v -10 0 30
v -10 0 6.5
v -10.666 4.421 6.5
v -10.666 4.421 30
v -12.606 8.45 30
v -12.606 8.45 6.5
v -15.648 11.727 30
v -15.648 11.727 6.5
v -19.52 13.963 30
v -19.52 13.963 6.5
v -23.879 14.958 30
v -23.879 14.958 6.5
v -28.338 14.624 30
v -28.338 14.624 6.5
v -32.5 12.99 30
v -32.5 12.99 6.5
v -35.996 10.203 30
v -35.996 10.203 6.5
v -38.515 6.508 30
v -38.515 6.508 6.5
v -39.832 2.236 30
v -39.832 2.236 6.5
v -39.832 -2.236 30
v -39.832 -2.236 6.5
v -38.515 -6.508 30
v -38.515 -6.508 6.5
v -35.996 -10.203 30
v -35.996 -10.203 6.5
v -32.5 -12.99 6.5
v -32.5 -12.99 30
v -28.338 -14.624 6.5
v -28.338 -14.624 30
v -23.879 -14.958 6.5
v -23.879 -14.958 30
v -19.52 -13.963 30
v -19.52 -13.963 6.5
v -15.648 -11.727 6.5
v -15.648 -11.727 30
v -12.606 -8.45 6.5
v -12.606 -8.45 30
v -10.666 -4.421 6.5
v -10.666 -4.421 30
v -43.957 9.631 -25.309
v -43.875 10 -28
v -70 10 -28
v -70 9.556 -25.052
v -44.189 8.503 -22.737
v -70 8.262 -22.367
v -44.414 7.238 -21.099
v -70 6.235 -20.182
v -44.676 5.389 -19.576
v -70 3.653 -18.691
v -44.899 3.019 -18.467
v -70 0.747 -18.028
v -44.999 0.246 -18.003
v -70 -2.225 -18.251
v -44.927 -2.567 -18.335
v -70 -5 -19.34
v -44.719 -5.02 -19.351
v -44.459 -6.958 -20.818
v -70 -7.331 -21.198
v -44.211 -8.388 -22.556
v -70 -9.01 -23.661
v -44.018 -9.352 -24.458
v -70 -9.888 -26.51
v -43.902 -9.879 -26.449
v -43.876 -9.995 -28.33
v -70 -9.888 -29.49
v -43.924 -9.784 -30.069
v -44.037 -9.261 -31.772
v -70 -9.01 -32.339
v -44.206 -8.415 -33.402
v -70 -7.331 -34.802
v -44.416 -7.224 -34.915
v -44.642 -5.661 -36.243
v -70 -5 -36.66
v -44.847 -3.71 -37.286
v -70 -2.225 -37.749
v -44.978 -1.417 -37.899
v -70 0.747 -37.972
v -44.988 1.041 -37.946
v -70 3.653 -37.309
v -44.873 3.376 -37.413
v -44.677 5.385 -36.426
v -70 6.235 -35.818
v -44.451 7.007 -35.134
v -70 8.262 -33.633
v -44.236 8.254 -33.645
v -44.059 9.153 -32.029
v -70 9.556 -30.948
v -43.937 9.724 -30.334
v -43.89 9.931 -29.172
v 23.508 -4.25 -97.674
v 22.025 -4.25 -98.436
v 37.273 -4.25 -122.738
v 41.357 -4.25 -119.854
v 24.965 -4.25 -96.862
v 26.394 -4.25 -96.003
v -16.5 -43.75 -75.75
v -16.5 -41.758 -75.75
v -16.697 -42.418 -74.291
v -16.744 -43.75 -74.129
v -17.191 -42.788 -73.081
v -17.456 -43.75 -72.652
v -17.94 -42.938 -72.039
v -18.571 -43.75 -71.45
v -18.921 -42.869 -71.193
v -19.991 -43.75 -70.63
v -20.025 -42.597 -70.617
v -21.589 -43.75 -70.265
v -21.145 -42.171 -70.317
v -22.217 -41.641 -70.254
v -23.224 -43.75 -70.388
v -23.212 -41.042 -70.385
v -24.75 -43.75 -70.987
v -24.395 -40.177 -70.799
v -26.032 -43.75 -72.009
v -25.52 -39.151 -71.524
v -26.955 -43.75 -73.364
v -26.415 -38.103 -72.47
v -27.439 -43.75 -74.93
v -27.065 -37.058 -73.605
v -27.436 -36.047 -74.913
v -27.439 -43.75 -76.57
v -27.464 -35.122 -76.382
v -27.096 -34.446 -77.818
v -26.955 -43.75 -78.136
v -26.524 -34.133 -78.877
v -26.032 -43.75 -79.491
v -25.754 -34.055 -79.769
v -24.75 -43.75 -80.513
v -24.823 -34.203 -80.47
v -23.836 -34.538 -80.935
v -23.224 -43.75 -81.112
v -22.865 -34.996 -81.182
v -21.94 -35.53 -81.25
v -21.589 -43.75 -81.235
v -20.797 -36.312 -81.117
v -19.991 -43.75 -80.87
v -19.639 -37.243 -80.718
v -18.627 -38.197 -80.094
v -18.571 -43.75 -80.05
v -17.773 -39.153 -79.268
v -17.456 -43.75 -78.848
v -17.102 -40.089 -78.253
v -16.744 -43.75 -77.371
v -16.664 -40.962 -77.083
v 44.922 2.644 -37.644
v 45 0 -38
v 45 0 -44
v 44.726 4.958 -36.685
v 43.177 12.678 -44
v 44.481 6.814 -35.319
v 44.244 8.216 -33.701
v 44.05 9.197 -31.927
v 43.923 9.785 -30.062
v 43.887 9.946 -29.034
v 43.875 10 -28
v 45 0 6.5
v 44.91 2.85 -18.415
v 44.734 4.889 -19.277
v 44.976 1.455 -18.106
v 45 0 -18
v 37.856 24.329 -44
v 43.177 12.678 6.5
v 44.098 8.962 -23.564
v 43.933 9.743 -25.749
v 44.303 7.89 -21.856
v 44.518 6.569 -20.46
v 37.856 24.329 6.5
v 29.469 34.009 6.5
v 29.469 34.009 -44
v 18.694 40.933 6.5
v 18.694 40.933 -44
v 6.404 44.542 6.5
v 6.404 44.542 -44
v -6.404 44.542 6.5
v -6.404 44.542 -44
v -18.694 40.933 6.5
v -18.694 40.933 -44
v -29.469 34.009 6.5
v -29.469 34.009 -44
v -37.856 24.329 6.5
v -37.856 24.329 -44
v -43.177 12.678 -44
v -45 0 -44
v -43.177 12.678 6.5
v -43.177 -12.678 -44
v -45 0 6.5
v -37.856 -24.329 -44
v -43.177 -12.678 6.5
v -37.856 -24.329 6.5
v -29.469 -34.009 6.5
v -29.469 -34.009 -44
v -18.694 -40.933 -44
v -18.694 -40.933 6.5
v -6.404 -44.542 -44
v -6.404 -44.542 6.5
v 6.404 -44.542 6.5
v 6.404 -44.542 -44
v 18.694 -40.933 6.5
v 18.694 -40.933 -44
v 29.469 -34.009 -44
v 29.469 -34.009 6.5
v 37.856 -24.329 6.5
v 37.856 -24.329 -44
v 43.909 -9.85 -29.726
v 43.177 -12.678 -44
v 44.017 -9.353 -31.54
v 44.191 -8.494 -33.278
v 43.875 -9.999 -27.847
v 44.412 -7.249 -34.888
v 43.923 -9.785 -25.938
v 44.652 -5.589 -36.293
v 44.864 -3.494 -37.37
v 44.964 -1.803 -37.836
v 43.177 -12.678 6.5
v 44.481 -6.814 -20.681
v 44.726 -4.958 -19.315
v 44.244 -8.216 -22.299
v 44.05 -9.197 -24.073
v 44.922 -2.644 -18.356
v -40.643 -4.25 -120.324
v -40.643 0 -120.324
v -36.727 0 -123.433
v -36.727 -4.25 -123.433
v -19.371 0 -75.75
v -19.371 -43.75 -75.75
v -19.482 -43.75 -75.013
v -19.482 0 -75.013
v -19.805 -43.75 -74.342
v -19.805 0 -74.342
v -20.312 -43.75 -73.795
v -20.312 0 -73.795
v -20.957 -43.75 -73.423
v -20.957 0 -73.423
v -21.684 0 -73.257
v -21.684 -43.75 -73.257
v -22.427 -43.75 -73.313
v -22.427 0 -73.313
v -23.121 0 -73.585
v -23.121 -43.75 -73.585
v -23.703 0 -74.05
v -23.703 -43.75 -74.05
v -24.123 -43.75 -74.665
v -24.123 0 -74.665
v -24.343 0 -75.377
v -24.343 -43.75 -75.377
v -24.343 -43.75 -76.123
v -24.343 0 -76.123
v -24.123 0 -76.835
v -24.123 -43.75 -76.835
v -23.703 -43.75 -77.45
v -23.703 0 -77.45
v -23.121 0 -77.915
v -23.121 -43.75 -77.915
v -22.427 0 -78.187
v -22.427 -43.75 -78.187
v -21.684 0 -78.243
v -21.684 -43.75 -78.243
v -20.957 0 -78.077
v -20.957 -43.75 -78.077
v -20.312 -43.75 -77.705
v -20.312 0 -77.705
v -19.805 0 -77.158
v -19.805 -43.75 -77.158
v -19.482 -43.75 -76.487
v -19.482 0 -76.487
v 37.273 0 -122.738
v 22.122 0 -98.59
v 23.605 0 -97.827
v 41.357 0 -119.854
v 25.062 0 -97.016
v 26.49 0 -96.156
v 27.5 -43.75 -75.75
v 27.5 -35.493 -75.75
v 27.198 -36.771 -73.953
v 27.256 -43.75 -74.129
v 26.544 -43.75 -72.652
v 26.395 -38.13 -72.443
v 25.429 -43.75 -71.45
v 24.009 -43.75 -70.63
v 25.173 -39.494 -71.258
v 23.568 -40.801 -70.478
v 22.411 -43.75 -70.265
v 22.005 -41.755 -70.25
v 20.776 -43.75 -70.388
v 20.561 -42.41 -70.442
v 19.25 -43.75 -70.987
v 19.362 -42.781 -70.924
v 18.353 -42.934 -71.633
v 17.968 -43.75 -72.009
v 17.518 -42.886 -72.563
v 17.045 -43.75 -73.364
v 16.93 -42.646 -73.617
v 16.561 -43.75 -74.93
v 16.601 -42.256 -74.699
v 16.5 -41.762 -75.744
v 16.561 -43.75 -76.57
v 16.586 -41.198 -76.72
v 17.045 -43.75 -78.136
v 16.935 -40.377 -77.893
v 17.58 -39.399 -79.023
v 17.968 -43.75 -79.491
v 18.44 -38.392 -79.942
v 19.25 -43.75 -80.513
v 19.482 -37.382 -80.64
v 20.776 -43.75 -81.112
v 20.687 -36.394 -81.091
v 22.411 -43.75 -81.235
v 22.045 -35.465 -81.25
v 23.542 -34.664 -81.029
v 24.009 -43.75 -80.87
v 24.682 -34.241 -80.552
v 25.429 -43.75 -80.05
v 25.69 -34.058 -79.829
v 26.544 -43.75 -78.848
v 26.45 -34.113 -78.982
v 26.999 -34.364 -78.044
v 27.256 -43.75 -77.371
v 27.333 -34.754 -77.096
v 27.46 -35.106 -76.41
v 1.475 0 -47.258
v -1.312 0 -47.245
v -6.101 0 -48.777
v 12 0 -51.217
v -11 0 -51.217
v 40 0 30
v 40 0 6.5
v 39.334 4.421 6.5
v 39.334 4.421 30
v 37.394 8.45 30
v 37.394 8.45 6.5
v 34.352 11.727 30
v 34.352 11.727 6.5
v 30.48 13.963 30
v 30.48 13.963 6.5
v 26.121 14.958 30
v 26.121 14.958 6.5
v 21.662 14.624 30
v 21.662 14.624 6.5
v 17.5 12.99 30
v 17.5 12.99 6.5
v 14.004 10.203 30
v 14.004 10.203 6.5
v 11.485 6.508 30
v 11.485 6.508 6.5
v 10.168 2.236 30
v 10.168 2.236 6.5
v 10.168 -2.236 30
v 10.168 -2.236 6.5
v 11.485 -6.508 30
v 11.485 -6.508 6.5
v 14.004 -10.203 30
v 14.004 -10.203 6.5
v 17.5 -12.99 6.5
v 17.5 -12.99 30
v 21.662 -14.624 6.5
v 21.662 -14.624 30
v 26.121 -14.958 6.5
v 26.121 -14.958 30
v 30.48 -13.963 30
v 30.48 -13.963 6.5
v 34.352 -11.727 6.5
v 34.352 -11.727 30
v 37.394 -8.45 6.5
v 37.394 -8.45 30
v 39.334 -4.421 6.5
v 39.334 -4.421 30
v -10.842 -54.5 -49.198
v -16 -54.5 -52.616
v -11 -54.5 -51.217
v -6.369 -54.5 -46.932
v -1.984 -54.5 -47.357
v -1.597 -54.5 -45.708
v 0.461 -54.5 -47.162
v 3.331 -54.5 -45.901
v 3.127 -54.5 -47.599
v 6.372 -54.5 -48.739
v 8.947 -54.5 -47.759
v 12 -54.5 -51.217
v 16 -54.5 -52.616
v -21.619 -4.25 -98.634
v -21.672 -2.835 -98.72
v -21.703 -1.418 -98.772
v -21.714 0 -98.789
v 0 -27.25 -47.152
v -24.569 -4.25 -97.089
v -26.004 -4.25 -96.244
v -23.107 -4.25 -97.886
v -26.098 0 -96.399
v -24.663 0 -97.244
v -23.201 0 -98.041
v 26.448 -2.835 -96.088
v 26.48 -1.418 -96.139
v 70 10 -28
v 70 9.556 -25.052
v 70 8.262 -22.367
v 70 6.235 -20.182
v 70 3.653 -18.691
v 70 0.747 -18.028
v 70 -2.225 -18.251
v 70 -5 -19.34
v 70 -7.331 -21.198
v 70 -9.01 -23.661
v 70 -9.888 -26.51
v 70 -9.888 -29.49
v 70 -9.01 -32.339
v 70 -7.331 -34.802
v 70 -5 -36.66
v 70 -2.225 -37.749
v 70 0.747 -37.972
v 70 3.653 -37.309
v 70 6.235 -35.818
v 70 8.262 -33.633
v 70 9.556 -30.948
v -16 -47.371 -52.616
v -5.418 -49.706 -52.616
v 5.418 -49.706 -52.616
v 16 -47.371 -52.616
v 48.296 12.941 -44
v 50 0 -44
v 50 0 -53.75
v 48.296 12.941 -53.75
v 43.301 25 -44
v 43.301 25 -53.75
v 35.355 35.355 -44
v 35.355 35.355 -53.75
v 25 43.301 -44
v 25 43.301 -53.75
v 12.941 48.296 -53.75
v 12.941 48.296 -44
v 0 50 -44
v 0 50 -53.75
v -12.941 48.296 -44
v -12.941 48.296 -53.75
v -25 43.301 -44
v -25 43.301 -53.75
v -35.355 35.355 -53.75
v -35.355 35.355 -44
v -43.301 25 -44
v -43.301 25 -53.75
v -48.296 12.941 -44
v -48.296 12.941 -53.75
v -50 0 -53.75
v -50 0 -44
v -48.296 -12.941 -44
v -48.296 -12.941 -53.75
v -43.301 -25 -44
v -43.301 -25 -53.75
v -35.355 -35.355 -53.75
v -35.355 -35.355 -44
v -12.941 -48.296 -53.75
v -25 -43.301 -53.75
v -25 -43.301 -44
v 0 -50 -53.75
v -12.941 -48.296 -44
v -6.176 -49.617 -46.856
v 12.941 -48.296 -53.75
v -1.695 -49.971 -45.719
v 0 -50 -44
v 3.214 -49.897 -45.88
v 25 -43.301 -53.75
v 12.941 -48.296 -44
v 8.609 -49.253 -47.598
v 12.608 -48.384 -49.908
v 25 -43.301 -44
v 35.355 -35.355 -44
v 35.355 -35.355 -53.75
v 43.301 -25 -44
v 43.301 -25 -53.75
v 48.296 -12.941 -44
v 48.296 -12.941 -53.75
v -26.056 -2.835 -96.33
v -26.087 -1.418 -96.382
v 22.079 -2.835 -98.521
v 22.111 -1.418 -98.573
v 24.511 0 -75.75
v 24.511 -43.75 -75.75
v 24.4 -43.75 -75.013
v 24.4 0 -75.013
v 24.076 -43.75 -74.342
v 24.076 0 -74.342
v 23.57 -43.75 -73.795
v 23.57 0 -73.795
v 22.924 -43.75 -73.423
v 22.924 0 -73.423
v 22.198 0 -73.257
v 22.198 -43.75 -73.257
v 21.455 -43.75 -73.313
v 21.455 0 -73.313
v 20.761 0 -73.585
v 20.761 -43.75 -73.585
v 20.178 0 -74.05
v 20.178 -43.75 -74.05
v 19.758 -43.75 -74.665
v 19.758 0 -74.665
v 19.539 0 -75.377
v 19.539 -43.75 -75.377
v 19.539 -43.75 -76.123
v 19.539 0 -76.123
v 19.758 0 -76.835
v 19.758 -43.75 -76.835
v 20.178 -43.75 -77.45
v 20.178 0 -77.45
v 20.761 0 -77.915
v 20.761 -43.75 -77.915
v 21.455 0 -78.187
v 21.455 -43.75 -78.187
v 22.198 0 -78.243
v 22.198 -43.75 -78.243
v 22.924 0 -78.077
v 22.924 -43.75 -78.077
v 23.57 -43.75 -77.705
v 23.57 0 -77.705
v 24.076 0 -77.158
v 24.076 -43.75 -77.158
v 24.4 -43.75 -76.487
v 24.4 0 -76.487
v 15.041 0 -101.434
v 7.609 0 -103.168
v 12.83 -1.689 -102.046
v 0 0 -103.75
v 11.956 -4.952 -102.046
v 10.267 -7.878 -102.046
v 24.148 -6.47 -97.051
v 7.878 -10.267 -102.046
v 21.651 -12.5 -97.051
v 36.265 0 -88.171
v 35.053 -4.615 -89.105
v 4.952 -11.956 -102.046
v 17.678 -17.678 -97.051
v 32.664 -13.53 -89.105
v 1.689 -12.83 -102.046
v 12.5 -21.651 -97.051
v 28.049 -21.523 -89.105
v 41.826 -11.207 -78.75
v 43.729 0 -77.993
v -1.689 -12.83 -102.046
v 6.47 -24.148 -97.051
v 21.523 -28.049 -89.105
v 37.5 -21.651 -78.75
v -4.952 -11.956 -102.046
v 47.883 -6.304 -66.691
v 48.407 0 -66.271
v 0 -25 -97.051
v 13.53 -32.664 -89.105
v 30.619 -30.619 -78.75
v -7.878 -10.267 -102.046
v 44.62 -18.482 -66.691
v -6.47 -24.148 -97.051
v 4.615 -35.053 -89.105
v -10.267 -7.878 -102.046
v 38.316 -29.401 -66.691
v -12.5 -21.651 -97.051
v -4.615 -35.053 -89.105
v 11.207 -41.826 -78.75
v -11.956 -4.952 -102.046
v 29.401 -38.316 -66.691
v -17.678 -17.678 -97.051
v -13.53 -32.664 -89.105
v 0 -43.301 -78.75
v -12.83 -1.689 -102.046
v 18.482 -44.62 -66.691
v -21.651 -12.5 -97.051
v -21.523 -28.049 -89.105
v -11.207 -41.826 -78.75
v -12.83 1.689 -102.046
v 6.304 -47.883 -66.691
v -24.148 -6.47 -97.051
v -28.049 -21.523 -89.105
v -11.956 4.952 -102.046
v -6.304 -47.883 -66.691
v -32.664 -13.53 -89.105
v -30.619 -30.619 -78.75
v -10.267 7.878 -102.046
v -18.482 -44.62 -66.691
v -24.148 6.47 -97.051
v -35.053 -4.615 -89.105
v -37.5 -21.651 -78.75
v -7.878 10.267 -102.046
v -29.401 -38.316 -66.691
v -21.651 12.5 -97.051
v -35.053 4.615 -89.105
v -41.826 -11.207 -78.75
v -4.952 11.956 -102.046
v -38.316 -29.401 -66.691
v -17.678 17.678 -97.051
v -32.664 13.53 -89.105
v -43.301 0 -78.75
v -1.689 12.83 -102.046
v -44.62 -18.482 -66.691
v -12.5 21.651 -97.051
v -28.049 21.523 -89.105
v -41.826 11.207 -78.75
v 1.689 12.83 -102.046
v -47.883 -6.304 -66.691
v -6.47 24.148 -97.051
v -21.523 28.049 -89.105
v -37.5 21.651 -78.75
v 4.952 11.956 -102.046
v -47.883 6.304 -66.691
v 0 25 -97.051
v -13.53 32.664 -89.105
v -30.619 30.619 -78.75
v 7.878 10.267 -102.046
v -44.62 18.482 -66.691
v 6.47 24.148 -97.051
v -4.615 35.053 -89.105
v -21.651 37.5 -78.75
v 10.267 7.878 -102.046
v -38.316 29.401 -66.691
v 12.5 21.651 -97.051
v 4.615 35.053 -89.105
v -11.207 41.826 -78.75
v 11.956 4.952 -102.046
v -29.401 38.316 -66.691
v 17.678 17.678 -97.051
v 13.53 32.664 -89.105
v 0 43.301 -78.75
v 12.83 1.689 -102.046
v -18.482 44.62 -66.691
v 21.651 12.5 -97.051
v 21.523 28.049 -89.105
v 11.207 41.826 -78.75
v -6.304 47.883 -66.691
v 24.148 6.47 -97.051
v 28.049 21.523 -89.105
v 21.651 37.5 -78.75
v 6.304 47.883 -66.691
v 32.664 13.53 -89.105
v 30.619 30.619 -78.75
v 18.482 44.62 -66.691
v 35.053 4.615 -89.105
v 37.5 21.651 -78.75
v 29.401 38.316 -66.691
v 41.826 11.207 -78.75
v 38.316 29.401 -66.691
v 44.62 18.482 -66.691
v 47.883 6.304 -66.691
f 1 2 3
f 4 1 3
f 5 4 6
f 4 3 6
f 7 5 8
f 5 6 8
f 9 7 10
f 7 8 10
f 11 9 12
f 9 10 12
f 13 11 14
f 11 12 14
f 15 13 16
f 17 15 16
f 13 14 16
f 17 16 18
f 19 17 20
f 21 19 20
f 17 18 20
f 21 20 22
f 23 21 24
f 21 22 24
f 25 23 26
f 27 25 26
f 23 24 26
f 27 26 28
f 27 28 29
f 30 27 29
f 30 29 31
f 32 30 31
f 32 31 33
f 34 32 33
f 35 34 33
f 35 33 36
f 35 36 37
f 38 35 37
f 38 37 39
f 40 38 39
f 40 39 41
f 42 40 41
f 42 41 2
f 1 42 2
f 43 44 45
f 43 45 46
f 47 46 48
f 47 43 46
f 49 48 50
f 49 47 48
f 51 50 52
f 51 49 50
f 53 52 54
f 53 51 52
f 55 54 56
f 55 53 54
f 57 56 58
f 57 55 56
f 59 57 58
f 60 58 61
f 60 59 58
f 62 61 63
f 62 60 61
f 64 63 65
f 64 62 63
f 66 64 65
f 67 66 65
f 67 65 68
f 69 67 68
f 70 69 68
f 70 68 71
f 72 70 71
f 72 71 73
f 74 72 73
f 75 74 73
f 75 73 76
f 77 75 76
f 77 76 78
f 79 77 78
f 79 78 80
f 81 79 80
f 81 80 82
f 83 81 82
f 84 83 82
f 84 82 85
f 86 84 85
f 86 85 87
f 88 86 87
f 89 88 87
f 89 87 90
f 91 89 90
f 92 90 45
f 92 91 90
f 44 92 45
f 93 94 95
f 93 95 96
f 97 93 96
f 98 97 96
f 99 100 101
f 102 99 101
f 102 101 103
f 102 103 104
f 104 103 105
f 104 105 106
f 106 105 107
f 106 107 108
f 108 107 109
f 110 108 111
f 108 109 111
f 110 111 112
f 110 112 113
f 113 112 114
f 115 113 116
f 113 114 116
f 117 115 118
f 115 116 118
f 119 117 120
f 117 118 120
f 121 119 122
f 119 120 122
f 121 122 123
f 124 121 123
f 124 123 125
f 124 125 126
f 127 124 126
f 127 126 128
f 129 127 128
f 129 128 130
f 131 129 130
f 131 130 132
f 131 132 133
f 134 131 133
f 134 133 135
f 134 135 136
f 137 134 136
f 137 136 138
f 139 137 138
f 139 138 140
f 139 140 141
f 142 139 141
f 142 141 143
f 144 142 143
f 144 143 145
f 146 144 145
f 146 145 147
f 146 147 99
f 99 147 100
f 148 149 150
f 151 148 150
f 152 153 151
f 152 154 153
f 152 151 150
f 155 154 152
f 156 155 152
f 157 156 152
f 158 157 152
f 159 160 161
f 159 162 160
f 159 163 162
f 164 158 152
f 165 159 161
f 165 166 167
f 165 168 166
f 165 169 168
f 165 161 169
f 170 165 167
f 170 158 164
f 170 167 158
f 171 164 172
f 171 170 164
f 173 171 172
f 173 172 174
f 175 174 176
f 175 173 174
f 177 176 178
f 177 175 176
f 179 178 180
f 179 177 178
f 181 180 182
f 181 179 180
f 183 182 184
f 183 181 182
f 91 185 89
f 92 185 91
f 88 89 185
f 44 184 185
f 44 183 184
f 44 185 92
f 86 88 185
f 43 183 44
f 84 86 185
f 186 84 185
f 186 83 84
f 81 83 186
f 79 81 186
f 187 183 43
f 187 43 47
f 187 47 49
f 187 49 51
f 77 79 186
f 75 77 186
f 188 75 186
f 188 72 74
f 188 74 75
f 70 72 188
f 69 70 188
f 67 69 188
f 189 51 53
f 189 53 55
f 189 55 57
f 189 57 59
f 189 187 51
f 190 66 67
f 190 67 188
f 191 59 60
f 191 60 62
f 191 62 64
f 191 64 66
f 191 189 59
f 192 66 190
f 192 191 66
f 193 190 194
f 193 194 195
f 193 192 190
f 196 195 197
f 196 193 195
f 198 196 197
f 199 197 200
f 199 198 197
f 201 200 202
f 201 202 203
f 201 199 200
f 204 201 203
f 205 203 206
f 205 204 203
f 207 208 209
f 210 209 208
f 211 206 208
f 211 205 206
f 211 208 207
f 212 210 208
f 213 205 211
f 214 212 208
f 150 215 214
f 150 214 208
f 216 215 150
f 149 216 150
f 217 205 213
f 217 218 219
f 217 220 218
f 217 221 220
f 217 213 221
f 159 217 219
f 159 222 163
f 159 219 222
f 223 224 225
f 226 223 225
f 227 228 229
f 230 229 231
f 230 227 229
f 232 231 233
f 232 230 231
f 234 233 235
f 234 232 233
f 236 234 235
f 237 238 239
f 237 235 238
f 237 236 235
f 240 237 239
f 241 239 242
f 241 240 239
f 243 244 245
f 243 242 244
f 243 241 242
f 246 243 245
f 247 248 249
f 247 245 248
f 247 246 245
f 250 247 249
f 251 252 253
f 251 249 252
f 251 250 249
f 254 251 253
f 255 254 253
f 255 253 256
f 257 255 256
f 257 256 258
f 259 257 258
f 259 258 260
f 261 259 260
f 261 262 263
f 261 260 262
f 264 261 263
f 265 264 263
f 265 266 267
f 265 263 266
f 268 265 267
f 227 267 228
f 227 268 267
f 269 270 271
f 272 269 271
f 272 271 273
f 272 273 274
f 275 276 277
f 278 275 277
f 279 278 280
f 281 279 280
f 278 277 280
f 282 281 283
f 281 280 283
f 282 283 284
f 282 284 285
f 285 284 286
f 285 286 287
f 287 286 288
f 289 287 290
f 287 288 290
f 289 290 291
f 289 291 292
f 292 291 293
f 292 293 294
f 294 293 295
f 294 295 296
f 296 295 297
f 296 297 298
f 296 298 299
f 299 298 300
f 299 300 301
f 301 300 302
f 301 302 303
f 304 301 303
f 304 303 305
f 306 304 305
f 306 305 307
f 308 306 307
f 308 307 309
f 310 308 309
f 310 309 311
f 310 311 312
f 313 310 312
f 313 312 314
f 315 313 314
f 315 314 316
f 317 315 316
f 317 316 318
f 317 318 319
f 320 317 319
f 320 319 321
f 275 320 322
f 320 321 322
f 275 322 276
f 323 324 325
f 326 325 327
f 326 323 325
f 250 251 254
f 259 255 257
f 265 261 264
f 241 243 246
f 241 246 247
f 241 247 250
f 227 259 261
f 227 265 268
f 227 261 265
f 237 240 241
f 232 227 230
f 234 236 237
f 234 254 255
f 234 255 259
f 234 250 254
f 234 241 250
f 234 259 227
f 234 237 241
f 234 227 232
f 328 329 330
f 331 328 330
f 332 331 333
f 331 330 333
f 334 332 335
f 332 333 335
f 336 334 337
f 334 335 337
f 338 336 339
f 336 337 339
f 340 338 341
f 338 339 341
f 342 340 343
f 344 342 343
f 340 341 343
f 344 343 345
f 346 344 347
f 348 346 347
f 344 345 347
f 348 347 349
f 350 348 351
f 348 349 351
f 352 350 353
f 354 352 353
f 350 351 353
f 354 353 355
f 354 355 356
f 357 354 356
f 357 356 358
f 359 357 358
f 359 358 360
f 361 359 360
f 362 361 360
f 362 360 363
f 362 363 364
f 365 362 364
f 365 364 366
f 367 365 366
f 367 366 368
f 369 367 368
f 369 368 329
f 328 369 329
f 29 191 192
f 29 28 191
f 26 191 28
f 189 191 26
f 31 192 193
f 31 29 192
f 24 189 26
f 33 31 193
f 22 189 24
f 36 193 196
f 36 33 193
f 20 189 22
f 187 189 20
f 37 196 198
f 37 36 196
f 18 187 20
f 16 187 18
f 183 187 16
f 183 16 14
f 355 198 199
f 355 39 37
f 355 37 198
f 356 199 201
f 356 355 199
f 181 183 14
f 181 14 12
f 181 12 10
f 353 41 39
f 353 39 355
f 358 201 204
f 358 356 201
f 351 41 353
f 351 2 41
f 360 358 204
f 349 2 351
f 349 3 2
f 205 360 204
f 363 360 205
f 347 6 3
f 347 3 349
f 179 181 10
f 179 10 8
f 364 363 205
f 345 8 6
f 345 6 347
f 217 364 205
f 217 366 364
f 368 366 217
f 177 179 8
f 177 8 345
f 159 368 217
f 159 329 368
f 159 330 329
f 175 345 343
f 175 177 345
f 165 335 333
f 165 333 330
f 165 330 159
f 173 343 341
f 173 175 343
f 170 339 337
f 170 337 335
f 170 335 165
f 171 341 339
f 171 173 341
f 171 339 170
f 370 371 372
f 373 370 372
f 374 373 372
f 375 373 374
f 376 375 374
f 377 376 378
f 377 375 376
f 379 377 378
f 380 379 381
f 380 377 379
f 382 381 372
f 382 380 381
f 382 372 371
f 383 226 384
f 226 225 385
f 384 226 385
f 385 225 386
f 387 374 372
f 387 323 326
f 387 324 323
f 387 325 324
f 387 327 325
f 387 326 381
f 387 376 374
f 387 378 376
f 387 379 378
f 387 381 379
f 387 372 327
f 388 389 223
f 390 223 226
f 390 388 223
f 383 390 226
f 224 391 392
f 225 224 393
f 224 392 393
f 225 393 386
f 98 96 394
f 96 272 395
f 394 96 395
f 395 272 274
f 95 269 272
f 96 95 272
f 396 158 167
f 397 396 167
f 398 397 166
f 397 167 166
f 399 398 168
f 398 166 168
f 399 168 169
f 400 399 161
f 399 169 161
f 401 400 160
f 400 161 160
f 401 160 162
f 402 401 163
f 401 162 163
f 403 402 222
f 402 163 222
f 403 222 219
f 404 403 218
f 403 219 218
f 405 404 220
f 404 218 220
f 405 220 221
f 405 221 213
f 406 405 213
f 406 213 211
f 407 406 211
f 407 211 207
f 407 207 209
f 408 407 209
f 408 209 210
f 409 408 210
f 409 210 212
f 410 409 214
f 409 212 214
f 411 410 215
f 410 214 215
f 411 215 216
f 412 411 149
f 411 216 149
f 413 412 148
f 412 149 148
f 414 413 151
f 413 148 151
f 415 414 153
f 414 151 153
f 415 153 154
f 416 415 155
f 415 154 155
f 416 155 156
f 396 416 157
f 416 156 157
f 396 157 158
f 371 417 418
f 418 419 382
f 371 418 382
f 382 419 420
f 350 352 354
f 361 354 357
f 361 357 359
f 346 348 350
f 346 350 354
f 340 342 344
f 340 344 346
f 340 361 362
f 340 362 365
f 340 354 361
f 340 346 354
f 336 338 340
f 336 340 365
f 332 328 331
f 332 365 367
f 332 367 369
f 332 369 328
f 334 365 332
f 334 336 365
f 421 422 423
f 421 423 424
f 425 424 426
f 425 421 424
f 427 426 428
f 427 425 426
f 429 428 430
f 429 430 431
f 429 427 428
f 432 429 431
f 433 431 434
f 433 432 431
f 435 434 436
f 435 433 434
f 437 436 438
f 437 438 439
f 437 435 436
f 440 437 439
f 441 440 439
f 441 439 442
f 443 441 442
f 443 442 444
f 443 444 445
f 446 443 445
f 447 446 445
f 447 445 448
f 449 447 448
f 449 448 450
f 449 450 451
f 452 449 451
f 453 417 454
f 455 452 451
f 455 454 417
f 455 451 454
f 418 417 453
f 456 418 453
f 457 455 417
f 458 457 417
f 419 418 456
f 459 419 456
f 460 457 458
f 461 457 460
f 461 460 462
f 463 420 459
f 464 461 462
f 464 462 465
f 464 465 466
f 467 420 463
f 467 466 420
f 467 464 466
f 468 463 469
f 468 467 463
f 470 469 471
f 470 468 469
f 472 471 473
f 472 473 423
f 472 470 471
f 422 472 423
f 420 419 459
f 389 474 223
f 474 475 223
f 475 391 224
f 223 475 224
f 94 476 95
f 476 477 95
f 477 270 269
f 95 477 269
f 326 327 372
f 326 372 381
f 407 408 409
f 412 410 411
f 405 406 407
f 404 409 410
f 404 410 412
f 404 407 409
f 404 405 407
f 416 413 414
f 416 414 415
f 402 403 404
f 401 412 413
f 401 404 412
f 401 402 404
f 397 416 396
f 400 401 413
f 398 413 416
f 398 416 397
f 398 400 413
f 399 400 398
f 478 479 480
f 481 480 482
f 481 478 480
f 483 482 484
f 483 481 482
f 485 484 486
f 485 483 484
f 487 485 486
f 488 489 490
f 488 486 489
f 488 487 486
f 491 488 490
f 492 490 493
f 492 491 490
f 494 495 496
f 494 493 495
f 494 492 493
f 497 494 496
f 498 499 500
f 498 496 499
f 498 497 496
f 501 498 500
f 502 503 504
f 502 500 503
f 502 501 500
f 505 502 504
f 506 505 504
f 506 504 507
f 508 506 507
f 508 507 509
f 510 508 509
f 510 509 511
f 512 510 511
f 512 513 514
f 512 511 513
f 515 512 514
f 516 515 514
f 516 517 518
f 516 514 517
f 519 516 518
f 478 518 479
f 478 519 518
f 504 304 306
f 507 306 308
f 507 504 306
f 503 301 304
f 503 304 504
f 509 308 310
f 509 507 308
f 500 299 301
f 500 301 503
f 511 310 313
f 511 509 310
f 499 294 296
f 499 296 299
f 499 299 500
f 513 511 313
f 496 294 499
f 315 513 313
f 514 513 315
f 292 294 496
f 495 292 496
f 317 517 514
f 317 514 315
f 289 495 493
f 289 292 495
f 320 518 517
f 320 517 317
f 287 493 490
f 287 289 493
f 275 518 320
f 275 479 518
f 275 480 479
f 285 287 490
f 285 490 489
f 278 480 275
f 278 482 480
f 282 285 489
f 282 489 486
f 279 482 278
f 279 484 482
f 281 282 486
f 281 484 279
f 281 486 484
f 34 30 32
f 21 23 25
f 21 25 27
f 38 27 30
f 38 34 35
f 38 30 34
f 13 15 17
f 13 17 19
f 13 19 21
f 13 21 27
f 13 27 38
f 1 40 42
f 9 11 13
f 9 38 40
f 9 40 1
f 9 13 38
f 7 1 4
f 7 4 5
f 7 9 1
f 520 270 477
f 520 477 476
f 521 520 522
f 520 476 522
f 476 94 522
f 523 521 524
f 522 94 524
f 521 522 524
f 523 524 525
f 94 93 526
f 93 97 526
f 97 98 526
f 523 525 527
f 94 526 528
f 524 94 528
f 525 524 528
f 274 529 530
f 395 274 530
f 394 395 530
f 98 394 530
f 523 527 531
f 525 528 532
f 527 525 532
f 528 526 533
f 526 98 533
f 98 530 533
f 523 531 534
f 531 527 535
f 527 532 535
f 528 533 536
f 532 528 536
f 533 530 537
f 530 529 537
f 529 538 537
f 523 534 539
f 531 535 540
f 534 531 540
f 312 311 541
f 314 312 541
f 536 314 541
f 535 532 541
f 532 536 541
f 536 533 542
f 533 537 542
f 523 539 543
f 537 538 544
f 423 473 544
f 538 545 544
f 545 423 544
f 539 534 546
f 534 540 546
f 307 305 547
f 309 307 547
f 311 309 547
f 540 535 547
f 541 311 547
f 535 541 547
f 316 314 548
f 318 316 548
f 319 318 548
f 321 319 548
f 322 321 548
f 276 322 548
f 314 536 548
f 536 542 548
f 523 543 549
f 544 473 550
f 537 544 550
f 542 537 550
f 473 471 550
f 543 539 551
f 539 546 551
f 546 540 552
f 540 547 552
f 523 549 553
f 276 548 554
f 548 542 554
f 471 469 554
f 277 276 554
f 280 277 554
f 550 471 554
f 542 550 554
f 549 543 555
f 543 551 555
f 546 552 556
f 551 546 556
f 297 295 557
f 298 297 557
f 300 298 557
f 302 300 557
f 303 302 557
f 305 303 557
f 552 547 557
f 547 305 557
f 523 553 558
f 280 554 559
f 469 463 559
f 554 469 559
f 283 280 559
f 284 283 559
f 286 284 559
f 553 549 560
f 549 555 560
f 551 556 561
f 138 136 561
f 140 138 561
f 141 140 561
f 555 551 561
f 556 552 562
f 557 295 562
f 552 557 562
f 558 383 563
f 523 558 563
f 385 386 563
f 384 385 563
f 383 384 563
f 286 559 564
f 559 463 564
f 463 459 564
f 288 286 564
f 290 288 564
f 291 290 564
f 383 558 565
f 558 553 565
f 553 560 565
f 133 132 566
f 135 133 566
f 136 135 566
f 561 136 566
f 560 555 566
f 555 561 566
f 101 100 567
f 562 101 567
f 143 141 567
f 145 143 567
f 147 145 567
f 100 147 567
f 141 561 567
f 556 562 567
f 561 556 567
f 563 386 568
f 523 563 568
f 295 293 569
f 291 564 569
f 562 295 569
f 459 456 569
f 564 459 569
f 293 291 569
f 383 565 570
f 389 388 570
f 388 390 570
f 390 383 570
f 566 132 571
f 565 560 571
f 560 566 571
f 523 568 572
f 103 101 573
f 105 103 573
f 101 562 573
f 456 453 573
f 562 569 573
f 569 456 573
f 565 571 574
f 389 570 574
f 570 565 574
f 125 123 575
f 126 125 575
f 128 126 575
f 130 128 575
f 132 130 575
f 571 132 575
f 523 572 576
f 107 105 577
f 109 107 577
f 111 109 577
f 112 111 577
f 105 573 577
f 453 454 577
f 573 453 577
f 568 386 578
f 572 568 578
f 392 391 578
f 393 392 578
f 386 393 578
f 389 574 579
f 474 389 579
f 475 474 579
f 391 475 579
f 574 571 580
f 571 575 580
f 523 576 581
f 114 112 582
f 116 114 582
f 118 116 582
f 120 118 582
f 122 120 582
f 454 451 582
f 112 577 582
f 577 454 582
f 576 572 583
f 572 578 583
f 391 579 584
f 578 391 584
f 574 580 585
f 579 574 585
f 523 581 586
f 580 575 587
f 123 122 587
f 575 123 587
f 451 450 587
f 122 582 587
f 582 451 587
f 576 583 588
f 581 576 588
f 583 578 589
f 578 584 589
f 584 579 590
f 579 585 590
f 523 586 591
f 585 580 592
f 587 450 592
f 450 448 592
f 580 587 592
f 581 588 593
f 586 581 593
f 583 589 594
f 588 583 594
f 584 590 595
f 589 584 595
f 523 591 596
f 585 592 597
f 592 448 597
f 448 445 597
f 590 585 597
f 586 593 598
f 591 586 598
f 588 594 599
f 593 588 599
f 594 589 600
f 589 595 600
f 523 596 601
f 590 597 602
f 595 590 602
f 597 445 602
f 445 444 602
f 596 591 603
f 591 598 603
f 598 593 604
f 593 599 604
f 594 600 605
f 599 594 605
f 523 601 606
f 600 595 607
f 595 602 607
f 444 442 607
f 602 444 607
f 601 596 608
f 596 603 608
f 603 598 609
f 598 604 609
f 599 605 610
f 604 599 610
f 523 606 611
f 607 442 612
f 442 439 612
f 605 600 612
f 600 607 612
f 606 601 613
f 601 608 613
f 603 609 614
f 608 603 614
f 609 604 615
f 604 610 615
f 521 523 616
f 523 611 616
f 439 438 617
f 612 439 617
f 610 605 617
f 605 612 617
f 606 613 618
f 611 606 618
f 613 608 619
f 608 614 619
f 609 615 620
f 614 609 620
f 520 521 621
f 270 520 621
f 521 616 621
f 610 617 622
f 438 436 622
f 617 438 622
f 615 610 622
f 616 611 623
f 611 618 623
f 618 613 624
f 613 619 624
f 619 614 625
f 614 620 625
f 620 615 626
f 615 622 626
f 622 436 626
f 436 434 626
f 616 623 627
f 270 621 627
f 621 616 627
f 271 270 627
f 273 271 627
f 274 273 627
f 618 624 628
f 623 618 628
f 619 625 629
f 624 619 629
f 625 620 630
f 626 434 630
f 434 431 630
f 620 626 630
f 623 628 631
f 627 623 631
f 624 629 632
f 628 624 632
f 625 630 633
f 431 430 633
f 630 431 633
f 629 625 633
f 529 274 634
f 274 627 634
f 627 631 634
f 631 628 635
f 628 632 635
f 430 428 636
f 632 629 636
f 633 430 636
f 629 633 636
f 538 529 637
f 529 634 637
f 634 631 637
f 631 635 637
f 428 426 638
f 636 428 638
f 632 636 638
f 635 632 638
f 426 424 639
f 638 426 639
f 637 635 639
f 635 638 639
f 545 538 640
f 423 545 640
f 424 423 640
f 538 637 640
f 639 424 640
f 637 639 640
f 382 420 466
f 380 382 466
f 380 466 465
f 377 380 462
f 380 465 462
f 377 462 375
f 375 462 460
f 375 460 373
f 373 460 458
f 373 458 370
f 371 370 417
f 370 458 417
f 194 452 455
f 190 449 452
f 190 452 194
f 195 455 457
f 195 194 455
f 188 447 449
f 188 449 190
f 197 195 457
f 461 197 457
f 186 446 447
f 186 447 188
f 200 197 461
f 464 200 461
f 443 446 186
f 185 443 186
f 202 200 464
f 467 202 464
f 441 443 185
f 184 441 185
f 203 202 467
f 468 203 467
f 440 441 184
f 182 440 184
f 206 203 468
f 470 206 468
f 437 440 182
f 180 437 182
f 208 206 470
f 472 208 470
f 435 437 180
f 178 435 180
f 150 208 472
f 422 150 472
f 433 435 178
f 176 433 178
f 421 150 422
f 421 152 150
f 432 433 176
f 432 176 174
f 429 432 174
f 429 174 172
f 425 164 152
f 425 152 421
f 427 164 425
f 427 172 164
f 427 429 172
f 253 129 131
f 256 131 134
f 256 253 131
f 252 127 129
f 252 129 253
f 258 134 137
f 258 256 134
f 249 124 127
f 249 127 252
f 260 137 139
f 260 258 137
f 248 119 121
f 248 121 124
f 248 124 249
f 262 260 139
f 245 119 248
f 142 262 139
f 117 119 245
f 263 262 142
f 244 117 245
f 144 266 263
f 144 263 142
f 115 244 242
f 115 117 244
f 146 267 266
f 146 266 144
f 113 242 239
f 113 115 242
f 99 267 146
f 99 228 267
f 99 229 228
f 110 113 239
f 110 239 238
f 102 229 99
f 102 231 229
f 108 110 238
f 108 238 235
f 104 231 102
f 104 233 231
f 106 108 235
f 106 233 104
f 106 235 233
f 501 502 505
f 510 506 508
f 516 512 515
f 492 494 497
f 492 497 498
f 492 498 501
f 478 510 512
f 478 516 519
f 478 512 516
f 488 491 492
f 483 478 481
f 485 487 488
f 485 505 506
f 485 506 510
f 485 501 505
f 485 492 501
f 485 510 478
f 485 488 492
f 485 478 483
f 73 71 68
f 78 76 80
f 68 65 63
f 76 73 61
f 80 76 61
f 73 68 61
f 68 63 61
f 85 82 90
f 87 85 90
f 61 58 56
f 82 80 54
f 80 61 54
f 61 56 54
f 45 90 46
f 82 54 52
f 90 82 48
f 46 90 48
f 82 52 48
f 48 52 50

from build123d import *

# Parameters (mm, degrees)
F0_R          = 15
F3_DEPTH      = 30
F1_R          = 45
F4_DEPTH      = 50
F4_DEPTH_BACK = 6.5
F5_START      = -44
F2_R          = 50
F5_DEPTH      = 9.75
F6_R          = 10
F7_DEPTH      = 70
F8_R          = 10
F9_DEPTH      = 70
F12_R         = 5.5
F13_DEPTH     = 43.75
F14_R         = 2.5
F15_DEPTH     = 50.5
F17_DEPTH     = 4.25
F19_DEPTH     = 54.5
F21_DEPTH     = 63.5


with BuildPart() as f3:
    # F0 (on Top) → F3 (new body)
    with BuildSketch(Plane.XY):
        with Locations((-25, 0)):
            Circle(F0_R)
    extrude(amount=F3_DEPTH)



with BuildPart() as f3b:
    # F0 (on Top) → F3, piece 2 (new body)
    with BuildSketch(Plane.XY):
        with Locations((25, 0)):
            Circle(F0_R)
    extrude(amount=F3_DEPTH)


with BuildPart() as f3_1:
    add(f3.part)

    add(f3b.part)  # F4 merges F3b
    # F1 (on Top) → F4 (join, two sides)
    with BuildSketch(Plane.XY) as f4_sk:
        Circle(F1_R)
    extrude(amount=-F4_DEPTH)
    extrude(f4_sk.sketch, amount=F4_DEPTH_BACK)

    # F2 (on Top) → F5 (join)
    with BuildSketch(Plane.XY.offset(F5_START)):
        Circle(F2_R)
    extrude(amount=-F5_DEPTH)

    # F6 (on Right) → F7 (join)
    with BuildSketch(Plane.YZ):
        with Locations((0, -28)):
            Circle(F6_R)
    extrude(amount=F7_DEPTH)

    # F8 (on Right) → F9 (join)
    with BuildSketch(Plane.YZ):
        with Locations((0, -28)):
            Circle(F8_R)
    extrude(amount=-F9_DEPTH)

    # F10 (on Front) → F11 (revolve)
    with BuildSketch(Plane.XZ):
        with BuildLine():
            Line((0, -53.75), (0, -103.75))
            ThreePointArc((0, -103.75), (35.3553390593, -89.1053390593), (50, -53.75))
            Line((50, -53.75), (0, -53.75))
        make_face()
    revolve(axis=Axis((0, 0, -78.75), (0, 0, -1)))

    # F12 (on Front) → F13 (join)
    with BuildSketch(Plane.XZ):
        with Locations((22, -75.75)):
            Circle(F12_R)
        with Locations((-22, -75.75)):
            Circle(F12_R)
    extrude(amount=F13_DEPTH)

    # F14 (on Front) → F15 (cut)
    with BuildSketch(Plane.XZ):
        with Locations((22.0108069479, -75.75)):
            Circle(F14_R)
        with Locations((-21.8705814332, -75.75)):
            Circle(F14_R)
    extrude(amount=F15_DEPTH, mode=Mode.SUBTRACT)

    # F16 (on Front) → F17 (join)
    with BuildSketch(Plane.XZ):
        Polygon((37.273382177, -122.7384150805), (41.3573574255, -119.8537753855), (25.9457886256, -95.2878732623), (21.5874810644, -97.7384150805), align=None)
        Polygon((-40.6426425745, -120.3244923925), (-36.726617823, -123.4333105193), (-21.49733765, -98.4333105193), (-25.5781691914, -95.5442252089), align=None)
    extrude(amount=F17_DEPTH)

    # F18 (on Front) → F19 (join)
    with BuildSketch(Plane.XZ):
        with BuildLine():
            Line((-16, -52.6157000572), (16, -52.6157000572))
            add(Edge.make_bspline(
                [(16, -52.6157000572), (10.6081692502, -47.7225370705), (-0.6081692502, -43.4127992868), (-9.3918307498, -47.914664585), (-16, -52.6157000572)],
                knots=[0, 0, 0, 0, 0.5, 1, 1, 1, 1], degree=3))
        make_face()
    extrude(amount=F19_DEPTH)

    # F20 (on Front) → F21 (cut)
    with BuildSketch(Plane.XZ):
        with BuildLine():
            Line((-11, -51.2171401906), (12, -51.2171401906))
            add(Edge.make_bspline(
                [(12, -51.2171401906), (7.809161948, -49.4812574583), (-0.0193589542, -44.8915549483), (-7.190838052, -49.3467373151), (-11, -51.2171401906)],
                knots=[0, 0, 0, 0, 0.5096641908, 1, 1, 1, 1], degree=3))
        make_face()
    extrude(amount=F21_DEPTH, mode=Mode.SUBTRACT)


solid = f3_1.part
